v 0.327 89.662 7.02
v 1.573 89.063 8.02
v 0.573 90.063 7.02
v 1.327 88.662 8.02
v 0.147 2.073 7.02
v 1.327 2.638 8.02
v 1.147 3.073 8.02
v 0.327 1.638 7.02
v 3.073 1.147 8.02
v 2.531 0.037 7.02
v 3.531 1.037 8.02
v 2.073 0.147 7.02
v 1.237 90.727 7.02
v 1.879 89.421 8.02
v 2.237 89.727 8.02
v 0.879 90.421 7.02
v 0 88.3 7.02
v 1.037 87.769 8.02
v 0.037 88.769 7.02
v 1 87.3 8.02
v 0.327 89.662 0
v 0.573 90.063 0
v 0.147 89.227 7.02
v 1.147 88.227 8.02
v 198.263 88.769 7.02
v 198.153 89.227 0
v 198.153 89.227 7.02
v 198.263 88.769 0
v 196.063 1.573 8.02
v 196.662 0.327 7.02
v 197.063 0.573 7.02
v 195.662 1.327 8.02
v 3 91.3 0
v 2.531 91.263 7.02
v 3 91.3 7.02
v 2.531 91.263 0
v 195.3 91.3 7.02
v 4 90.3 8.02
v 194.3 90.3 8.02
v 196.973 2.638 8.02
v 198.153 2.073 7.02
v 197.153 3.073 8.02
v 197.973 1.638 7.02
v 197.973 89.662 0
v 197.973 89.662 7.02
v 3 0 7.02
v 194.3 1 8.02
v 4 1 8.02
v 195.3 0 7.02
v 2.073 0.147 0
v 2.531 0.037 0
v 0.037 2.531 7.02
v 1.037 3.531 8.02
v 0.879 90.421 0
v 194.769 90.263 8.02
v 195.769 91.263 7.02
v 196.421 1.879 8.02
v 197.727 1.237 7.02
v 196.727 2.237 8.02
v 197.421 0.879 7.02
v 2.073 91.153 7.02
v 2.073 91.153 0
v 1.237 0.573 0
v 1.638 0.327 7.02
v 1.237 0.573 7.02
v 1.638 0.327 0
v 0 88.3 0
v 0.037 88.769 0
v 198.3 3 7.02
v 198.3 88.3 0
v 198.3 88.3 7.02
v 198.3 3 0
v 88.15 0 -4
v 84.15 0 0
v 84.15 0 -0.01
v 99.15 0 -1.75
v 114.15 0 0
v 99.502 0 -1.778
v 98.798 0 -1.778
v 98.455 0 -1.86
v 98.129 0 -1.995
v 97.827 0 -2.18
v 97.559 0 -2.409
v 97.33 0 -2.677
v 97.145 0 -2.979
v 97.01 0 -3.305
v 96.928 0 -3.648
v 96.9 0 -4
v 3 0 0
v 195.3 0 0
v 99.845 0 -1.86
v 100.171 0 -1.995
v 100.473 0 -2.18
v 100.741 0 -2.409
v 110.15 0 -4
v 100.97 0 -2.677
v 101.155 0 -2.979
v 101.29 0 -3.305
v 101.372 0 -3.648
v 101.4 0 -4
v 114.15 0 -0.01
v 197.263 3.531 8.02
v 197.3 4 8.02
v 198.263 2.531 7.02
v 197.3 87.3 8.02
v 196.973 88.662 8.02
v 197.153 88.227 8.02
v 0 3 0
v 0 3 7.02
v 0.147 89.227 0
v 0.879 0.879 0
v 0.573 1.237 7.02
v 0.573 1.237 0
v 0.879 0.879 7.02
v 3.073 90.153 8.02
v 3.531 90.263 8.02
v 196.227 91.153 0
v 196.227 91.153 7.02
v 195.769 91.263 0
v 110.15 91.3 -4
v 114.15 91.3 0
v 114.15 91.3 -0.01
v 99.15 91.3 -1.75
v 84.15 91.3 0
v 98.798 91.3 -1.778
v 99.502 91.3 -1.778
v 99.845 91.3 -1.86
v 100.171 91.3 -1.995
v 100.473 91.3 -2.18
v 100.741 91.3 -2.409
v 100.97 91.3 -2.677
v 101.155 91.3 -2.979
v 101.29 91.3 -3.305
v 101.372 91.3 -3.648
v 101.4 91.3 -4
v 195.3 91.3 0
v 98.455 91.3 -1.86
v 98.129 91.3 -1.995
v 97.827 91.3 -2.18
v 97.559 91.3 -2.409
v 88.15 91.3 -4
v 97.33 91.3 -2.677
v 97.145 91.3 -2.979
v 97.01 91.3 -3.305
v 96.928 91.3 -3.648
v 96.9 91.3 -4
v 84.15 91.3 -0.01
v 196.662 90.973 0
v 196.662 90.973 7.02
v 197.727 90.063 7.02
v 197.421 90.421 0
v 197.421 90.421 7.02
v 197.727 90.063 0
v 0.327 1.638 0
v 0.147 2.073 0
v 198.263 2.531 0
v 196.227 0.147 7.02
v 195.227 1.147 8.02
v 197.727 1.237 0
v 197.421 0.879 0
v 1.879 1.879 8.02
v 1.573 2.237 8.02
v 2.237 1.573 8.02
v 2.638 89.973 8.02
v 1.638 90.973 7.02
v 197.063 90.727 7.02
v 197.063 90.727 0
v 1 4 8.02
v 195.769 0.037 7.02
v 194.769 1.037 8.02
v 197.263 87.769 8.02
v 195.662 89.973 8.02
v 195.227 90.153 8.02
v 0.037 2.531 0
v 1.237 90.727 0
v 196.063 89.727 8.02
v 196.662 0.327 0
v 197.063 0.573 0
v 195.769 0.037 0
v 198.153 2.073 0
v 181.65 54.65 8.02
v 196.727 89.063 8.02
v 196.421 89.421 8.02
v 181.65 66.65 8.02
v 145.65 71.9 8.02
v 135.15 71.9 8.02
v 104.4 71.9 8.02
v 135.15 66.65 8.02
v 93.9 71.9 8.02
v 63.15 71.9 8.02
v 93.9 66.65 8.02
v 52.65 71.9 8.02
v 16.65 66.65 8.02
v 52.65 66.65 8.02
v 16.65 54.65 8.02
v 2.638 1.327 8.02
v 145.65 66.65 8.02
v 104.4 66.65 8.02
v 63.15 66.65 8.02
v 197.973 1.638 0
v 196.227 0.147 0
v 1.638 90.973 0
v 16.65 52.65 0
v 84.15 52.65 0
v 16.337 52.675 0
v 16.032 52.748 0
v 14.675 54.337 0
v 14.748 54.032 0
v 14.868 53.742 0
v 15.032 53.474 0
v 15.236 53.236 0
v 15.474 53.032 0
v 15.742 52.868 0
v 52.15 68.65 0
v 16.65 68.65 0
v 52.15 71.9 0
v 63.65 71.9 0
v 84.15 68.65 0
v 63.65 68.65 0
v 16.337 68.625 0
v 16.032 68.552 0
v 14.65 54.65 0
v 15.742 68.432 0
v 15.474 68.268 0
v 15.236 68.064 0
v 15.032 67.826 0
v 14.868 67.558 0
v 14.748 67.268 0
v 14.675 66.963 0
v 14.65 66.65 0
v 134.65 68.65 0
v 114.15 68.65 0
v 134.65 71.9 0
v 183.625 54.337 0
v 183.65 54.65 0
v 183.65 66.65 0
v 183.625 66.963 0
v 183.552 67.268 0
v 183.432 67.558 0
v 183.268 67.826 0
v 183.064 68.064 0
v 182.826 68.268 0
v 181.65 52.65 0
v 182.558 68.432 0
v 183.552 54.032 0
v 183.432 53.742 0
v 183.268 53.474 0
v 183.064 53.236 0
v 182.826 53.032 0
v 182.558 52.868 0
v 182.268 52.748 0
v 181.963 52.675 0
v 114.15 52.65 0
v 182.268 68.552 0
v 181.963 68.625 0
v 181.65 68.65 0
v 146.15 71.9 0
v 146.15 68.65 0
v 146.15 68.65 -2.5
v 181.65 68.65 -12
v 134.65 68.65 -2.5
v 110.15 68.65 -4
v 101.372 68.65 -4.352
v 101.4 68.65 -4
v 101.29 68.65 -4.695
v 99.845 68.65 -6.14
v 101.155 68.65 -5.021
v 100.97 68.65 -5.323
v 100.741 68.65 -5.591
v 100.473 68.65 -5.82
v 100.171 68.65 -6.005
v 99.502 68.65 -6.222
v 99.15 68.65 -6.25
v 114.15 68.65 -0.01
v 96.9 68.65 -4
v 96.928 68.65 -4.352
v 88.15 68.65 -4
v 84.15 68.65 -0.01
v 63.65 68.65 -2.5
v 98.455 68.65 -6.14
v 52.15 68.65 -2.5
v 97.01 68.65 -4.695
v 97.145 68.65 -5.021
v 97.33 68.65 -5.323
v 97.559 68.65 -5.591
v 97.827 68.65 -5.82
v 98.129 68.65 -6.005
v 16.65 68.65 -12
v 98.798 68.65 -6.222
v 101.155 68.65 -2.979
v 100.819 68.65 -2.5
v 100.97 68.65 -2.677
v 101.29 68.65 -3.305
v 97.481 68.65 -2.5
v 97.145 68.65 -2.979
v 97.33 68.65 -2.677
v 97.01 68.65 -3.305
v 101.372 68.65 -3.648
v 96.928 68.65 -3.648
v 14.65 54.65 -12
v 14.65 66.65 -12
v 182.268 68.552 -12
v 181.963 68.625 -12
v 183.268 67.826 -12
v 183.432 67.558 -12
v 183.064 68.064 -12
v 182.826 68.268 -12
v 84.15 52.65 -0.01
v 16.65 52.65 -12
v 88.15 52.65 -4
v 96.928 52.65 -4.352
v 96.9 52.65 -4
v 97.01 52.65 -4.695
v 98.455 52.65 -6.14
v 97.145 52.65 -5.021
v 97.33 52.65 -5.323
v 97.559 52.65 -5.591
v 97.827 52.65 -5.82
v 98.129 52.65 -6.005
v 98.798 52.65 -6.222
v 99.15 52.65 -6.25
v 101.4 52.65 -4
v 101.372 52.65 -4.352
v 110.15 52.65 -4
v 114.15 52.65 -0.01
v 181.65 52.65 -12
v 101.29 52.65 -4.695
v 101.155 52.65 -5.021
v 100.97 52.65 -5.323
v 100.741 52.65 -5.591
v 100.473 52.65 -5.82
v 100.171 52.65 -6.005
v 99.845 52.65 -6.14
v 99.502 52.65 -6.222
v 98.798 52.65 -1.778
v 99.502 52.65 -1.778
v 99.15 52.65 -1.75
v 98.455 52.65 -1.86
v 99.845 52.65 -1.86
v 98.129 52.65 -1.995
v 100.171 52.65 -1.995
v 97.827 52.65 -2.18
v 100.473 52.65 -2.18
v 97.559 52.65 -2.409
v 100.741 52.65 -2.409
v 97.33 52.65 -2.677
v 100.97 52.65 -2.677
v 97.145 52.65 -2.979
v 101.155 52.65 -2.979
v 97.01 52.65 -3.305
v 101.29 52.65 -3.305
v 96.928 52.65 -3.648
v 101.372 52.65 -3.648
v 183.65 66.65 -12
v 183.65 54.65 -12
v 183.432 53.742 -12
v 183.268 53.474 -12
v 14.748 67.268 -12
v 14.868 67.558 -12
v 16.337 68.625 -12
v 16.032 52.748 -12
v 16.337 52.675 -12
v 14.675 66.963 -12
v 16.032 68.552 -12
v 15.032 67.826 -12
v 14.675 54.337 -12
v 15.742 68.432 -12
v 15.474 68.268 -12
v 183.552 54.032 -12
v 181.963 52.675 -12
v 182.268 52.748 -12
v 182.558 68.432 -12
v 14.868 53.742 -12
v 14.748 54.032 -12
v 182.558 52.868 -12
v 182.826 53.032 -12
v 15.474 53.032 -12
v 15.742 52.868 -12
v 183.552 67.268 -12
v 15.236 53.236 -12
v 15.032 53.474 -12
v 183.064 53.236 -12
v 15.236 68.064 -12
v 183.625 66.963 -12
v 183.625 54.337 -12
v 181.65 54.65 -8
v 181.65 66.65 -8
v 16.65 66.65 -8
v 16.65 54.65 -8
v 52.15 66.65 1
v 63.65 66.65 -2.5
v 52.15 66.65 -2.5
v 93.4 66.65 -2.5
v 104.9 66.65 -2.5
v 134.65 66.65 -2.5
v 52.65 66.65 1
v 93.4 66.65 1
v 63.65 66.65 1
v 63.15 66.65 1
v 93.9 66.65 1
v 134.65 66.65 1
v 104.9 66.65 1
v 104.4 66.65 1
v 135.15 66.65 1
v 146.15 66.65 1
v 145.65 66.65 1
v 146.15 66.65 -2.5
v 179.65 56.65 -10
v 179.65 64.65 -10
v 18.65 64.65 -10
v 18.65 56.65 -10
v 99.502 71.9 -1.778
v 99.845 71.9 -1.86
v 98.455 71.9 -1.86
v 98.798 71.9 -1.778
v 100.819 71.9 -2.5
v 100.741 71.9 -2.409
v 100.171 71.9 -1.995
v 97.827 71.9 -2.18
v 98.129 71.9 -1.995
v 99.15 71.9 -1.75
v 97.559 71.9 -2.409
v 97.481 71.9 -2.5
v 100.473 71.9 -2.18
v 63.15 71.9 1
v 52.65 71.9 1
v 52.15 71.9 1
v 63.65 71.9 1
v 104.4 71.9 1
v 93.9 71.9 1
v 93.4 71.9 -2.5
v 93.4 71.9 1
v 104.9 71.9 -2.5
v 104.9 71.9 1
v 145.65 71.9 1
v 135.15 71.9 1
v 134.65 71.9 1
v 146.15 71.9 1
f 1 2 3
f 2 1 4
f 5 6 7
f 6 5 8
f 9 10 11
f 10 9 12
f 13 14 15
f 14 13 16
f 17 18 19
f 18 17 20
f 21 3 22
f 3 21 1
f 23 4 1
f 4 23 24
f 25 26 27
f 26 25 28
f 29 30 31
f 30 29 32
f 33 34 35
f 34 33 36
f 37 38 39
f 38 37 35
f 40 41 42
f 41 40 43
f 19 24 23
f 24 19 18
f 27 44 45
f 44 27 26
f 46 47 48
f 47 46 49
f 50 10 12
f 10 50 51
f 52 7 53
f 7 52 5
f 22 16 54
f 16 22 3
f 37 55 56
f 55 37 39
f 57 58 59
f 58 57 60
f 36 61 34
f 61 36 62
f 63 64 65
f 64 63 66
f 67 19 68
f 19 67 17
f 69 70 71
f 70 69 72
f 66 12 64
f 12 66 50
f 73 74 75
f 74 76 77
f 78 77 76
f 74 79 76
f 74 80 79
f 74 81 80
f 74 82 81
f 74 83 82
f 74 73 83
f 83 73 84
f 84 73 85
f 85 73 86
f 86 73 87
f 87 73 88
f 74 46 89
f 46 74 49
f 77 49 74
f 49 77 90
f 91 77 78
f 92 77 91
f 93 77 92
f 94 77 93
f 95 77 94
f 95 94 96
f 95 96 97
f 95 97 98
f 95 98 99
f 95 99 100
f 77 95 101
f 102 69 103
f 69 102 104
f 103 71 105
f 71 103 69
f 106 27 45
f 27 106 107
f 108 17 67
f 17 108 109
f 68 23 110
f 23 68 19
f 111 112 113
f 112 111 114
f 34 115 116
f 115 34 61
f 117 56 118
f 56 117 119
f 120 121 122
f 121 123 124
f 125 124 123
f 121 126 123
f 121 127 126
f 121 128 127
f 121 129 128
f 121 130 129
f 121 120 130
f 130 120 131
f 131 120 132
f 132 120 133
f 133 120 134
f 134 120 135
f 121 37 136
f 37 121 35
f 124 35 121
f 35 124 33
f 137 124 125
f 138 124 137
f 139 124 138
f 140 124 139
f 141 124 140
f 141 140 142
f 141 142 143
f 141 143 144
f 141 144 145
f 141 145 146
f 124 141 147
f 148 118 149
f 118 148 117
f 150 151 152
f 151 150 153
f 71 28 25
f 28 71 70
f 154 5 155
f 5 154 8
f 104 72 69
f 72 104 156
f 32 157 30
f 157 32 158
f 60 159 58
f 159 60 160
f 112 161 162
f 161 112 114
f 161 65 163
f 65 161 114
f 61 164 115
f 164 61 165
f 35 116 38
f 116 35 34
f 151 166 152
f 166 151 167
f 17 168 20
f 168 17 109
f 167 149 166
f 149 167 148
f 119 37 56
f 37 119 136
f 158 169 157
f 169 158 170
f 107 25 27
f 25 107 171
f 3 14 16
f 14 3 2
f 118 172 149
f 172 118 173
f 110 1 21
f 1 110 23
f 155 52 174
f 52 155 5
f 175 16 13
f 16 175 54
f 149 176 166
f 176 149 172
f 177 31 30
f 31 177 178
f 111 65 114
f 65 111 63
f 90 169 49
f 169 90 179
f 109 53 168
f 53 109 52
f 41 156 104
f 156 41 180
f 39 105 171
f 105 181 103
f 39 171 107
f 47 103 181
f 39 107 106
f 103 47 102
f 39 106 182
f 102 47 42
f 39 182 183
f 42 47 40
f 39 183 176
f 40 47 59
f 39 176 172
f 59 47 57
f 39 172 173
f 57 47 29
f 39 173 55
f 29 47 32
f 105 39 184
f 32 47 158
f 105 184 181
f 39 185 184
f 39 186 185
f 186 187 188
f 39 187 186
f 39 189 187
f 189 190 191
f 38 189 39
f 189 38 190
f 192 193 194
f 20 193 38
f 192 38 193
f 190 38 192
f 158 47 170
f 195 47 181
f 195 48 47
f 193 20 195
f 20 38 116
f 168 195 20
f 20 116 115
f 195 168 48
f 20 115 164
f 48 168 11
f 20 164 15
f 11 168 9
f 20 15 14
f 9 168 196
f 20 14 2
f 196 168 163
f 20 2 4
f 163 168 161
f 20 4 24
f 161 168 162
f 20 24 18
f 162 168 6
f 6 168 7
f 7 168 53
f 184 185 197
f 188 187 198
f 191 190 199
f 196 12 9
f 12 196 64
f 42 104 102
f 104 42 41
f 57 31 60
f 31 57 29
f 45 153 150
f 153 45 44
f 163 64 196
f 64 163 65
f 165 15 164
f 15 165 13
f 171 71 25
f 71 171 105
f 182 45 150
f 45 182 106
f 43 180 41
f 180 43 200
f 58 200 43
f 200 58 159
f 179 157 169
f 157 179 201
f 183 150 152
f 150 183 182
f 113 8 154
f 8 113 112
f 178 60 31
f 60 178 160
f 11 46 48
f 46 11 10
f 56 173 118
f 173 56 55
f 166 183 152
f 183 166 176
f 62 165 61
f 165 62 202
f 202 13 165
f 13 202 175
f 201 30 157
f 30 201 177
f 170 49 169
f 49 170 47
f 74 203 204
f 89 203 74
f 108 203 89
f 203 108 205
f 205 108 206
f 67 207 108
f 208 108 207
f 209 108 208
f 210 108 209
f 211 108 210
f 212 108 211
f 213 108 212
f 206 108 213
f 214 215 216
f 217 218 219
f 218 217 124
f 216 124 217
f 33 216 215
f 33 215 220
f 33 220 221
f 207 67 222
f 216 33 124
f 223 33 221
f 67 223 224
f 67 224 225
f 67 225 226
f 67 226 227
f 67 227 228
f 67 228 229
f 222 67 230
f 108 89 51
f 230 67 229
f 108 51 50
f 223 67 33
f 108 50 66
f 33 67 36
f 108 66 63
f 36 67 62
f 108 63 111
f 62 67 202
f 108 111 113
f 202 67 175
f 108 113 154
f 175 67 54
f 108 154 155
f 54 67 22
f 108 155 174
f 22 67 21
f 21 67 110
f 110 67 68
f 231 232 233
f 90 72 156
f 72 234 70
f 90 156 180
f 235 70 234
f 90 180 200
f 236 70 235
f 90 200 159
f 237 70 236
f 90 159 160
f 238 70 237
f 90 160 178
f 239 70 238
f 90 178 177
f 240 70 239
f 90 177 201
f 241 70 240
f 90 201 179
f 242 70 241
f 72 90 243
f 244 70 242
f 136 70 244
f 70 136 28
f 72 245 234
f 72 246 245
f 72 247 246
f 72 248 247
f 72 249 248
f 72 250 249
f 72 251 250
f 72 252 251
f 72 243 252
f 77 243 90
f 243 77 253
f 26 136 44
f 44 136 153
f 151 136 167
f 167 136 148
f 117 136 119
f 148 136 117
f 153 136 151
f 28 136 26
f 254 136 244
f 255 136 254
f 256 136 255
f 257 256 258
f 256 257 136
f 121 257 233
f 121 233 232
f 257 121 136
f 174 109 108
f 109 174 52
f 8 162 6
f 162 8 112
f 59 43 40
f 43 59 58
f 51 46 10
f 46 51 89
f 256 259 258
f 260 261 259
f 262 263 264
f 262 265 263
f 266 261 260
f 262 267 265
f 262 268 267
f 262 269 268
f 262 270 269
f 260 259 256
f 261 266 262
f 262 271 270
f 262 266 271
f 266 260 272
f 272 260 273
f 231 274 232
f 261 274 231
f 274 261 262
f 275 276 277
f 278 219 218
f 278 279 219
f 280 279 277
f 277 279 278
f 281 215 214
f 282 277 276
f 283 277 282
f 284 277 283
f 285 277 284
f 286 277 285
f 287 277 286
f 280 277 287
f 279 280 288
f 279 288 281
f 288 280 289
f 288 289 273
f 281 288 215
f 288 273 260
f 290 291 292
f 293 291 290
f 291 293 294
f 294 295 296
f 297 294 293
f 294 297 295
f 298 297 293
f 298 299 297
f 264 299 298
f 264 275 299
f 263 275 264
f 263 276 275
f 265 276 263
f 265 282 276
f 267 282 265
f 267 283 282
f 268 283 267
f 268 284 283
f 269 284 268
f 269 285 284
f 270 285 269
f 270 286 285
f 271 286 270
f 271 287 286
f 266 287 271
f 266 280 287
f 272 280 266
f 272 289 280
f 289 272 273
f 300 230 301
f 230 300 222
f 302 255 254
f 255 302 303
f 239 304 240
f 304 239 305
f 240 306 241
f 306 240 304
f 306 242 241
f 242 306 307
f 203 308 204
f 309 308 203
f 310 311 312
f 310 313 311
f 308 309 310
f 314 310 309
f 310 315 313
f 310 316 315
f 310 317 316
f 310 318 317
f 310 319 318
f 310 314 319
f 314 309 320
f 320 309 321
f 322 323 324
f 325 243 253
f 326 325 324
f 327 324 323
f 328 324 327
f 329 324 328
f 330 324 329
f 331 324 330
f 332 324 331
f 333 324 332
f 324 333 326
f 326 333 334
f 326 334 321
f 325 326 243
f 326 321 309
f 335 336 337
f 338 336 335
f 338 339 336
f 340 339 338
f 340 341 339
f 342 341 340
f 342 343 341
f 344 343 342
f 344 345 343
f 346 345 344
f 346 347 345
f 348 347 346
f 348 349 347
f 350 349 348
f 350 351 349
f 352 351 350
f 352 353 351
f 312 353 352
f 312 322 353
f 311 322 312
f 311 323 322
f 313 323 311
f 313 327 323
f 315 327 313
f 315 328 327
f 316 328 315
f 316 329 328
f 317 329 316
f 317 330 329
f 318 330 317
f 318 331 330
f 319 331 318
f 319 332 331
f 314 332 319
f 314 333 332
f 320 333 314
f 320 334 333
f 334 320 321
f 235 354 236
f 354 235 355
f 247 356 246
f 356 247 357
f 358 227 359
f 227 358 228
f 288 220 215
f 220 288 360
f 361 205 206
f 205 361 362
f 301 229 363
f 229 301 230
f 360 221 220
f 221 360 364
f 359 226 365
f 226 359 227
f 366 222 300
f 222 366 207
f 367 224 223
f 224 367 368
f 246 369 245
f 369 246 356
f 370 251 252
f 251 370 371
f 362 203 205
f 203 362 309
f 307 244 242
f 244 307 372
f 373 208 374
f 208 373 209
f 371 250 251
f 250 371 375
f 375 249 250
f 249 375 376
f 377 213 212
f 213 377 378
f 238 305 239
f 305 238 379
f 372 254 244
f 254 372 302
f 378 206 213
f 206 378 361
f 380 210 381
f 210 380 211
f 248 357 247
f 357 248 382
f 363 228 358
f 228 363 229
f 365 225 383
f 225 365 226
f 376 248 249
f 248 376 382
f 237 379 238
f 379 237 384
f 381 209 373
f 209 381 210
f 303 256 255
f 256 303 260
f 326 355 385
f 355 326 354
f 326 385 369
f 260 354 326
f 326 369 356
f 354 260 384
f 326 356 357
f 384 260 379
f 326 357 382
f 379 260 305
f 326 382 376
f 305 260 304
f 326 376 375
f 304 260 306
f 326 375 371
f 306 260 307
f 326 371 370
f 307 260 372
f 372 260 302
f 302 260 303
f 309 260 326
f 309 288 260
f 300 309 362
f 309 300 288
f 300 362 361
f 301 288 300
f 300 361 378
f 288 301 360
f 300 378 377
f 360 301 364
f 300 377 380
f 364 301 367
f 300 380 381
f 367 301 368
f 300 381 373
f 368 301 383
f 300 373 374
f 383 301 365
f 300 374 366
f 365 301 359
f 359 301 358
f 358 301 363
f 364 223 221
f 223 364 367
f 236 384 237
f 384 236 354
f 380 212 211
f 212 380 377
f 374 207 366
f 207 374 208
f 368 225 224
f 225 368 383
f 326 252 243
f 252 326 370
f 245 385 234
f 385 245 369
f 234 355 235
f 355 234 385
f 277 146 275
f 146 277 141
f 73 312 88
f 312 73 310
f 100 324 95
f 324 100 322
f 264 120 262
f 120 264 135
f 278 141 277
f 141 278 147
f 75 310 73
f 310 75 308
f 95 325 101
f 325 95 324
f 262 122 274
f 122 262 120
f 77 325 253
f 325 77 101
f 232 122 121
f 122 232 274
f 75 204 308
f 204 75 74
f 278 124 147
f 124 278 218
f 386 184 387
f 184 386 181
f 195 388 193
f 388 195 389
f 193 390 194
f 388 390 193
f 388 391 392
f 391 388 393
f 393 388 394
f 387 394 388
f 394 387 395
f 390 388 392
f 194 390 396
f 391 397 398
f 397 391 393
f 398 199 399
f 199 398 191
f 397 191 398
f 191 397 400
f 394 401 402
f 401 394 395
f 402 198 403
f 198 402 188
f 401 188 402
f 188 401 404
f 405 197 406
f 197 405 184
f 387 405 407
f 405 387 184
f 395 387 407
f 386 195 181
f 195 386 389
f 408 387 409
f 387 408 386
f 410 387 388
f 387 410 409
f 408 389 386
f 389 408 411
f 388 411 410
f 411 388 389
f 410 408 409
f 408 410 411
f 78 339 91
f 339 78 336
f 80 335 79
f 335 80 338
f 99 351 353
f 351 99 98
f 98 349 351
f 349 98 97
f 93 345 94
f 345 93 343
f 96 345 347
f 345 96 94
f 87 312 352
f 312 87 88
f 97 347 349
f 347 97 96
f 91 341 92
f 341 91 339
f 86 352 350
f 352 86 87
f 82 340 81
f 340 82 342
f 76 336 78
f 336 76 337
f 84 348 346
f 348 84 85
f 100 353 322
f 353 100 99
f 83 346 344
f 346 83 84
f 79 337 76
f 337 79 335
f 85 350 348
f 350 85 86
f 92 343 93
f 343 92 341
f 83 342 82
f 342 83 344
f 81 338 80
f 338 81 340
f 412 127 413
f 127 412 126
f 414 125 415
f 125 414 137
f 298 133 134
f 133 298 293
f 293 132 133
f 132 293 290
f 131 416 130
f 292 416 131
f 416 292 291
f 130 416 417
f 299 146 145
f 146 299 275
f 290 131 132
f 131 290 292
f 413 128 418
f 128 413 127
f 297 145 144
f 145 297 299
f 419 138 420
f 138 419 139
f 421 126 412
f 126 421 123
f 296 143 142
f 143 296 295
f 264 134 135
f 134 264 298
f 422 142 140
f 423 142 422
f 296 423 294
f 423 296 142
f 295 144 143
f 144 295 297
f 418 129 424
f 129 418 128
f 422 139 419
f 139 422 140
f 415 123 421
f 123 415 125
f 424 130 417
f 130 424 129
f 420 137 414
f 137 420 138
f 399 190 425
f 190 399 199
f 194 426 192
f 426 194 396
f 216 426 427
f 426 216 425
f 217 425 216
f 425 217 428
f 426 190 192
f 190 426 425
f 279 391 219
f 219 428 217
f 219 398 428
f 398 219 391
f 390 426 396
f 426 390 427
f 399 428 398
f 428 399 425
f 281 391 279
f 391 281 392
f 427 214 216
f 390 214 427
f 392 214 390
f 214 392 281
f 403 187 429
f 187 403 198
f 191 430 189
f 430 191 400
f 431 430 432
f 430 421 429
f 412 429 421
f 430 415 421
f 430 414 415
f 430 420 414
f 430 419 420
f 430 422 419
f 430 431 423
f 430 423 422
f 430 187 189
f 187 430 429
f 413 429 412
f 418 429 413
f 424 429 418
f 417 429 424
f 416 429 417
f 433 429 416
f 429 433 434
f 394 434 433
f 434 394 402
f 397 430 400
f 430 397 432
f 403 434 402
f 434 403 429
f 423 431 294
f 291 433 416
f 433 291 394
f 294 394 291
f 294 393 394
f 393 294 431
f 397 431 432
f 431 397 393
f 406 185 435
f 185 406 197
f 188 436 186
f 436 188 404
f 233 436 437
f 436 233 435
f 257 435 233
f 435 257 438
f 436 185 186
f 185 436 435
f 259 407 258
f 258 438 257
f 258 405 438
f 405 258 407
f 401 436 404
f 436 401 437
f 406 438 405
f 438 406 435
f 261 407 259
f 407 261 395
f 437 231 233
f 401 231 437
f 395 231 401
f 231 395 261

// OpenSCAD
// file: config.scad
// ============================================
// Tempest Schachuhr - Gemeinsame Konfiguration
// ============================================
// Alle Masse in mm

// --- Druckbett-Limit ---
druckbett = 220; // Ender 3: 220x220mm

// --- FDM Toleranzen ---
tol = 0.25;       // Allgemeine Passtoleranz
tol_tight = 0.15; // Enge Passung (Snap-fit)
tol_loose = 0.35; // Lose Passung (leichtgaengig)

// --- Gesamtabmessungen Basis ---
basis_laenge = 210;
basis_breite = 100;
basis_hoehe  = 25;
basis_wand   = 4;       // Wandstaerke
basis_radius = 5;       // Kantenverrundung

// --- Pivot (Wippenlager) ---
pivot_radius    = 2;    // Halbrundes Profil
pivot_breite    = basis_breite - 2*basis_wand; // Steg laeuft von Wand zu Wand
pivot_hoehe_auf_basis = basis_hoehe - basis_wand; // Oberkante Basis-Innenwand

// --- Vorab-Definitionen (benoetigt fuer anschlag_hoehe) ---
wippe_nut_tiefe  = 2.5;
boden_dicke      = 2;

// --- Anschlaege ---
anschlag_abstand = 70;  // Abstand vom Pivot zum Anschlag (mm)
anschlag_breite  = 10;
anschlag_tiefe   = 4;
kipp_winkel      = 5;   // Max. Kippwinkel in Grad
// Berechnete Hoehe (vom Boden bis Kipp-Limit)
anschlag_hoehe   = (basis_hoehe + pivot_radius - wippe_nut_tiefe)
                   - anschlag_abstand * sin(kipp_winkel)
                   - boden_dicke;

// --- Wippe ---
wippe_kipp_freiraum = 1.5; // Extra Kuerzung pro Seite fuer Kippbewegung (mm)
wippe_laenge = basis_laenge - 2 * (basis_wand + tol_loose + wippe_kipp_freiraum);
wippe_breite = basis_breite - 2 * (basis_wand + tol_loose);
wippe_hoehe  = 8;
wippe_nut_radius = pivot_radius + tol; // V-Nut passend zum Pivot
fase_oben        = 1;           // 45°-Fase an Wippe-Oberkanten (Freiraum beim Kippen)

// --- Verstaerkung Wippe-Mitte (Buckel nach unten) ---
verstaerkung_breite = 30;  // Breite der Verdickung entlang X (um Pivot-Mitte)
verstaerkung_hoehe  = 4;   // Wie weit der Buckel nach unten ragt

// --- Smartphone-Schlitz ---
// Schlitz laeuft laengs entlang der X-Achse (wie beim Tempest-Original)
slot_laenge = 165;      // Laenge des Schlitzes (entlang X / Laengsachse)
slot_breite = 12;       // Breite des Schlitzes (entlang Y / Handy-Dicke)
slot_offset_y = 15;     // Schlitz-Versatz nach hinten (Y+) vom Zentrum
lehne_hoehe = 22;       // Rueckenlehne hinter dem Schlitz (Handy lehnt dagegen)
lehne_dicke = 5;        // Wandstaerke der Rueckenlehne
lehne_winkel = 10;      // Neigung nach hinten in Grad

// --- Lehne Steckverbindung (Spreizzapfen mit Rastnasen) ---
lehne_zapfen_laenge = 10;   // Zapfenlaenge in X (mm)
lehne_zapfen_tiefe  = 10;   // Gesamtlaenge Zapfen (laenger als Wippe fuer Snap)
lehne_zapfen_anzahl = 3;    // Anzahl Zapfen
lehne_zapfen_spalt  = 1.5;  // Spalt zwischen Zapfen-Haelften (mm)
lehne_zapfen_nub    = 0.5;  // Rastnase Ueberstand (mm)
lehne_zapfen_nub_h  = 1.5;  // Rastnase Hoehe (mm)

// --- Handy-Tasche (haengt unter der Wippe, wippt mit) ---
tasche_tiefe    = 12;   // Wie tief die Tasche unter der Wippe haengt
tasche_wand     = 2;    // Wandstaerke der Tasche
tasche_boden    = 2;    // Bodendicke im Schlitz (Handy steht darauf)

// --- Gummifuesse ---
fuss_durchmesser = 10;
fuss_hoehe       = 2;
fuss_abstand_x   = 15;  // Abstand vom Rand
fuss_abstand_y   = 15;

// --- Farben fuer Assembly ---
farbe_basis  = [0.3, 0.3, 0.3, 0.9];
farbe_wippe  = [0.6, 0.6, 0.7, 0.9];
farbe_lehne  = [0.8, 0.5, 0.3, 0.9];

// --- Hilfsvariable ---
$fn = 40; // Aufloesung fuer Rundungen
// main file
// ============================================
// Tempest Schachuhr - Teil 2: Wippe (Rocker)
// ============================================
// Kippbare Platte mit laengs laufendem Smartphone-Schlitz
// Schlitz laeuft entlang X-Achse (Laengsachse) wie beim Original
// Unter dem Schlitz haengt eine Tasche in die Basis (wippt mit)

use <config.scad>
include <config.scad>

module wippe() {
    difference() {
        union() {
            // Hauptplatte
            wippe_platte();

            // Tasche unter der Wippe (haengt nach unten in die Basis)
            handy_tasche();

            // Verstaerkung: Mitte dicker nach unten (Buckel um Pivot)
            wippe_verstaerkung();
        }

        // Smartphone-Schlitz aussparen (mit Boden)
        schlitz_ausschnitt();

        // V-Nut auf der Unterseite (fuer Pivot)
        wippe_nut();

        // Loecher fuer Lehne-Zapfen (Presspassung)
        lehne_loecher();
    }

}

// --- Hauptplatte mit 45°-Fase oben ---
module wippe_platte() {
    r = 3;
    hull() {
        // Volle Grundflaeche
        minkowski() {
            cube([wippe_laenge - 2*r, wippe_breite - 2*r, 0.01]);
            translate([r, r, 0]) cylinder(r=r, h=0.01);
        }
        // Volle Groesse bis Fasenbeginn
        translate([0, 0, wippe_hoehe - fase_oben])
            minkowski() {
                cube([wippe_laenge - 2*r, wippe_breite - 2*r, 0.01]);
                translate([r, r, 0]) cylinder(r=r, h=0.01);
            }
        // Eingerueckte Oberkante
        translate([fase_oben, fase_oben, wippe_hoehe])
            minkowski() {
                cube([wippe_laenge - 2*r - 2*fase_oben,
                      wippe_breite - 2*r - 2*fase_oben, 0.01]);
                translate([r, r, 0]) cylinder(r=r, h=0.01);
            }
    }
}

// --- Handy-Tasche ---
// Kasten der unter der Wippe haengt, fest verbunden, wippt mit
// Vertikale Kanten abgerundet (r=2)
// Geschlossen auf allen 4 Seiten (inkl. links/rechts)
module handy_tasche() {
    sx = (wippe_laenge - slot_laenge) / 2;
    sy = wippe_breite/2 - slot_breite/2 + slot_offset_y;
    r = 2;

    // Tasche um tasche_wand in X erweitert -> links/rechts geschlossen
    translate([sx - tasche_wand, sy - tasche_wand, -tasche_tiefe])
        minkowski() {
            cube([slot_laenge + 2*tasche_wand - 2*r,
                  slot_breite + 2*tasche_wand - 2*r,
                  tasche_tiefe / 2]);
            translate([r, r, 0])
                cylinder(r=r, h=tasche_tiefe / 2);
        }
}

// --- Schlitz-Ausschnitt ---
// Von oben eingefraest, Boden bleibt (tasche_boden dick)
// Handy steht auf dem Boden und wippt mit
// Tascheninnenraum mit 45-Grad-Fasen am Boden (druckbar umgedreht)
module schlitz_ausschnitt() {
    sx = (wippe_laenge - slot_laenge) / 2;
    sy = wippe_breite/2 - slot_breite/2 + slot_offset_y;

    // Oberer Schlitz durch die Wippe (ab tasche_boden bis oben)
    translate([sx, sy, tasche_boden])
        cube([slot_laenge, slot_breite, wippe_hoehe + 10]);

    // Inneres der Tasche mit 45-Grad-Fasen nahe Boden
    // Volle Slot-Masse ab tasche_wand ueber Boden,
    // verjuengt sich zum Boden hin um tasche_wand auf jeder Seite
    hull() {
        // Volle Groesse ab Fasenkante bis oben
        translate([sx, sy, -tasche_tiefe + tasche_boden + tasche_wand])
            cube([slot_laenge, slot_breite, tasche_tiefe - tasche_wand]);
        // Verjuengt am Boden (45-Grad-Uebergang)
        translate([sx + tasche_wand, sy + tasche_wand,
                   -tasche_tiefe + tasche_boden])
            cube([slot_laenge - 2*tasche_wand,
                  slot_breite - 2*tasche_wand, 0.01]);
    }
}

// --- V-Nut auf der Unterseite ---
// Unterbrochen im Tasche-Bereich (wie Pivot-Steg in der Basis)
module wippe_nut() {
    nut_r = wippe_nut_radius;
    mitte_x = wippe_laenge / 2;

    // Tasche Y-Bereich
    sy = wippe_breite/2 - slot_breite/2 + slot_offset_y;
    tasche_y1 = sy - tasche_wand;
    tasche_y2 = sy + slot_breite + tasche_wand;

    // Nut vor der Tasche (am Boden des Verstaerkungs-Buckels)
    translate([mitte_x, -0.1, -verstaerkung_hoehe])
        rotate([-90, 0, 0])
            cylinder(r=nut_r, h=tasche_y1 + 0.1, $fn=40);

    // Nut hinter der Tasche
    translate([mitte_x, tasche_y2, -verstaerkung_hoehe])
        rotate([-90, 0, 0])
            cylinder(r=nut_r, h=wippe_breite - tasche_y2 + 0.1, $fn=40);
}

// --- Verstaerkung: Buckel auf der Unterseite in der Mitte ---
// Trapezfoermiger Querschnitt: oben buendig mit Wippe-Unterseite,
// nach unten schmaler werdend (45-Grad-Schraegen)
module wippe_verstaerkung() {
    mitte_x = wippe_laenge / 2;

    hull() {
        // Oben: breiter, buendig mit Wippe-Unterseite (Z=0)
        translate([mitte_x - verstaerkung_breite/2, 0, -0.01])
            cube([verstaerkung_breite, wippe_breite, 0.01]);

        // Unten: schmaler (45-Grad-Schraegen links/rechts)
        translate([mitte_x - verstaerkung_breite/2 + verstaerkung_hoehe,
                   0, -verstaerkung_hoehe])
            cube([verstaerkung_breite - 2*verstaerkung_hoehe,
                  wippe_breite, 0.01]);
    }
}

// --- Loecher fuer Lehne-Zapfen (Durchgang + Rastnase-Freiraum) ---
module lehne_loecher() {
    sx = (wippe_laenge - slot_laenge) / 2;
    sy = wippe_breite/2 - slot_breite/2 + slot_offset_y + slot_breite;
    abstand = slot_laenge / (lehne_zapfen_anzahl + 1);
    durchsteck = lehne_zapfen_tiefe - wippe_hoehe;

    for (i = [1:lehne_zapfen_anzahl]) {
        loch_x = sx + i * abstand;

        // Durchgangsloch (durch gesamte Wippe)
        translate([loch_x - (lehne_zapfen_laenge/2 + tol),
                   sy - tol,
                   -1])
            cube([lehne_zapfen_laenge + 2*tol,
                  lehne_dicke + 2*tol,
                  wippe_hoehe + 2]);

        // Freiraum fuer Rastnasen (breiter, unter der Wippe)
        translate([loch_x - (lehne_zapfen_laenge/2 + lehne_zapfen_nub + tol),
                   sy - tol,
                   -(durchsteck + 0.5)])
            cube([lehne_zapfen_laenge + 2*(lehne_zapfen_nub + tol),
                  lehne_dicke + 2*tol,
                  durchsteck + 0.5 + 1]);
    }
}

// Rendern
wippe();
